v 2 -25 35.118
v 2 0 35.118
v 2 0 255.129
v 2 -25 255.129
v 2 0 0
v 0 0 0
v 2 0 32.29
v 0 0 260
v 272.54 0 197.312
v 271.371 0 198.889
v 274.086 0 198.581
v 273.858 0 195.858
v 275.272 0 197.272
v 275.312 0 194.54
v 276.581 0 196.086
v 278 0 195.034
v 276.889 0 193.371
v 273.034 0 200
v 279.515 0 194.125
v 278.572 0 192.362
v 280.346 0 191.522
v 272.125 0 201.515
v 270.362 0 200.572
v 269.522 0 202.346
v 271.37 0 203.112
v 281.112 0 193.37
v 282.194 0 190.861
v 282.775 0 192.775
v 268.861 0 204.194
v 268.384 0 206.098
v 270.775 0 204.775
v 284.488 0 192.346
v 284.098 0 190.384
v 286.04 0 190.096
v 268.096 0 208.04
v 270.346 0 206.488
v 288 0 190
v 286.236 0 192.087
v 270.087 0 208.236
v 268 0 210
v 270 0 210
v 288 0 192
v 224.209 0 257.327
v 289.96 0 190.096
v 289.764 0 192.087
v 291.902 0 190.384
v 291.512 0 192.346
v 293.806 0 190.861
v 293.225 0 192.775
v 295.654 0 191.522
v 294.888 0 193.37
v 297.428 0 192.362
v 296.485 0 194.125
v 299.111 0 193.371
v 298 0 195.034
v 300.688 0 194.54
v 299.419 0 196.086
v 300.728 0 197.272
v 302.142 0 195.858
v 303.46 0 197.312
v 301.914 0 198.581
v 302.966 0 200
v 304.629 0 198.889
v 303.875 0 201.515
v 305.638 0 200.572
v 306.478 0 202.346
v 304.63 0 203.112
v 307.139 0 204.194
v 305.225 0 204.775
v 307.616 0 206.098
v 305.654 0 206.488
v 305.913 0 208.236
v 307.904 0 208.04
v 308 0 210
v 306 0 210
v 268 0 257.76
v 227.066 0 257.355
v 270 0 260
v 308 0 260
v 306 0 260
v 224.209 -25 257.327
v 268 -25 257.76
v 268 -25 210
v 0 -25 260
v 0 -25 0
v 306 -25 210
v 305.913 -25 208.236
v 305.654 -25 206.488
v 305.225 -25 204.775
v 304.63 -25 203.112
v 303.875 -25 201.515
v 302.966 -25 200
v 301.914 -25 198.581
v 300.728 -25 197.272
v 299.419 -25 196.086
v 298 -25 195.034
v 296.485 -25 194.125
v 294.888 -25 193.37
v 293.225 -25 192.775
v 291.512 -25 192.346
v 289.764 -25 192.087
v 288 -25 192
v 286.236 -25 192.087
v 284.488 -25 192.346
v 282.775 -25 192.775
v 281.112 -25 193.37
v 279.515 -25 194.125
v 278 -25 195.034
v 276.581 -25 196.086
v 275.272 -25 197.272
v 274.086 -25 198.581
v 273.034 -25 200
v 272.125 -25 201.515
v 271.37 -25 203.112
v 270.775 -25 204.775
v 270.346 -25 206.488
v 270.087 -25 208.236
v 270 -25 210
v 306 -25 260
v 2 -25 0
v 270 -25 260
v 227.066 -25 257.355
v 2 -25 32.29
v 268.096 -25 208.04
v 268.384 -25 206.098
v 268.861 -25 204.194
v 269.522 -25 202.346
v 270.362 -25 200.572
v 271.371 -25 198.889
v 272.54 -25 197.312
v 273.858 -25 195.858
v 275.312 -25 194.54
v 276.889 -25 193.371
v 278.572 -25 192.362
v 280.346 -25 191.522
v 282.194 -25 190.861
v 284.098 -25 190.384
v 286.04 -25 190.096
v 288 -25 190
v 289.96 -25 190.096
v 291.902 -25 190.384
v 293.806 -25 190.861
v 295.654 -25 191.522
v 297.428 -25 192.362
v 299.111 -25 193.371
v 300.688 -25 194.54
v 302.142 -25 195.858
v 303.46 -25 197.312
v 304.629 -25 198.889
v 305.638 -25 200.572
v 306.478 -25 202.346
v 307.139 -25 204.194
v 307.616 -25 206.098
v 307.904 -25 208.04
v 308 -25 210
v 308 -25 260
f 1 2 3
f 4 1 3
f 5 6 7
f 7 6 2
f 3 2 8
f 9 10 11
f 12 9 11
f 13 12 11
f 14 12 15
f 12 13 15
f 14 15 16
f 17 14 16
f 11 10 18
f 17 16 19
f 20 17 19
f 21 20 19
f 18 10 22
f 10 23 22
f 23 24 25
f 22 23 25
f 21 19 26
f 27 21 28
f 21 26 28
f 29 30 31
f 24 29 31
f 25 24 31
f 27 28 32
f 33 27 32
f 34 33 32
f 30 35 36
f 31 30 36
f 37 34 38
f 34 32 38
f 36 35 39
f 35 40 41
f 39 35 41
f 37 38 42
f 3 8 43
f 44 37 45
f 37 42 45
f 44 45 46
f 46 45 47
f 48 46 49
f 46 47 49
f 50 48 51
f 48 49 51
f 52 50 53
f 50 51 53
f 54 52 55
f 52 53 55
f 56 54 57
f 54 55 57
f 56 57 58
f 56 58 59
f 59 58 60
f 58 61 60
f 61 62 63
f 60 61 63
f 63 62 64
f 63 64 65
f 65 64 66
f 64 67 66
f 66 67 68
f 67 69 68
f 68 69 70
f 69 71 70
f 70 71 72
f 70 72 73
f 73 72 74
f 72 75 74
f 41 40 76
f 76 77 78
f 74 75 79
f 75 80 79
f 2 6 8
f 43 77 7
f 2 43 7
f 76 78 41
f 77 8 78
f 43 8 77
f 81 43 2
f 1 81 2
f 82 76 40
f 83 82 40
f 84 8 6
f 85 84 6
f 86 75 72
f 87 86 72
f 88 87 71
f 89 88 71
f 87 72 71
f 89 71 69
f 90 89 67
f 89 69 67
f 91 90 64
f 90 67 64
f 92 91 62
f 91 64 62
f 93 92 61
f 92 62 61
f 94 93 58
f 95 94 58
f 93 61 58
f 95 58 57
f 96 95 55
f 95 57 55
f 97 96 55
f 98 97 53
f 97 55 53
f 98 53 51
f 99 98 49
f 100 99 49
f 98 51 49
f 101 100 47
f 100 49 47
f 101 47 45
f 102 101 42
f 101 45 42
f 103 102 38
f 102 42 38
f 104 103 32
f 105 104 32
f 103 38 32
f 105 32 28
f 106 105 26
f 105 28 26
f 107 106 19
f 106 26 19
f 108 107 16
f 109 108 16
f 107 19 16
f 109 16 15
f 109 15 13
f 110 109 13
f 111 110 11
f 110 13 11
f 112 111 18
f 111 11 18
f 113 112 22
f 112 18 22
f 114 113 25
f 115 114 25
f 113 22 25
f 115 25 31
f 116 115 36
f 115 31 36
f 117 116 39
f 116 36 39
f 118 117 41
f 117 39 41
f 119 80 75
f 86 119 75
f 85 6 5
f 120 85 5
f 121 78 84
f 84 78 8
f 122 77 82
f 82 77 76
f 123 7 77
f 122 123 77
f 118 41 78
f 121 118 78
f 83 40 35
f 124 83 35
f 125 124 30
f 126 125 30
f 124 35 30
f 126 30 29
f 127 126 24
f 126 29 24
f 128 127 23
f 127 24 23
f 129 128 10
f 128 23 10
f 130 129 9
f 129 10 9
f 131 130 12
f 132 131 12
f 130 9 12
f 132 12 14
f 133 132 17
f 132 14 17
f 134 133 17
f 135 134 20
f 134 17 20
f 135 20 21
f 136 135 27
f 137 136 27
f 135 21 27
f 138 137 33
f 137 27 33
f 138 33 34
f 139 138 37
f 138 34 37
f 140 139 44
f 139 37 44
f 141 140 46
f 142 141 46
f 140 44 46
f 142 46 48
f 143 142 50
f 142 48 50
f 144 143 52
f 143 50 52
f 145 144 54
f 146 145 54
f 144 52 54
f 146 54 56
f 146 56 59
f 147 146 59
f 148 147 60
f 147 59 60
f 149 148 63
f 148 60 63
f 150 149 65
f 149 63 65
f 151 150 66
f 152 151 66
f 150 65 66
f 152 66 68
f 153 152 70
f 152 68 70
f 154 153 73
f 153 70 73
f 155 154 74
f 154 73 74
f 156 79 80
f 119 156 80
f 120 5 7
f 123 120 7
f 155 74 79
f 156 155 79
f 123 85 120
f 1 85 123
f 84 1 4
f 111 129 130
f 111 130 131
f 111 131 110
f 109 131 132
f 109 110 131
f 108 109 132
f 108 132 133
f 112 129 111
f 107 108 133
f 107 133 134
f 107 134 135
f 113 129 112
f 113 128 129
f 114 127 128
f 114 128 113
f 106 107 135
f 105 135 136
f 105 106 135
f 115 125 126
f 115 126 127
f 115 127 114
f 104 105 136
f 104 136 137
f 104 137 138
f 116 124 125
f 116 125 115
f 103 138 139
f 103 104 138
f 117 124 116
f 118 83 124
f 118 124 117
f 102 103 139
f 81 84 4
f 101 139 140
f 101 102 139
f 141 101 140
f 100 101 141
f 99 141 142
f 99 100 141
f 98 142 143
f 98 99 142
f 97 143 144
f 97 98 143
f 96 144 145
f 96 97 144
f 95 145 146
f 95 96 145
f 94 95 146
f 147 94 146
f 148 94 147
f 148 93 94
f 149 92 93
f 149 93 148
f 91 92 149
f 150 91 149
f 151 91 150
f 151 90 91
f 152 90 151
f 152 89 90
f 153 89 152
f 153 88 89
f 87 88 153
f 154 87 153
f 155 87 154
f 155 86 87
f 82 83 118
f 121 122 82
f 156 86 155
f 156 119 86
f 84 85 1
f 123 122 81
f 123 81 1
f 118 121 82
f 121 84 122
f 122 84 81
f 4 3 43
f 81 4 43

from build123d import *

# Parameters (mm, degrees)
F1_DEPTH = 25


with BuildPart() as f1:
    # F0 (on Front) → F1 (new body)
    with BuildSketch(Plane.XZ):
        with BuildLine():
            Line((0, 260), (0, 0))
            Line((0, 0), (2, 0))
            Line((2, 0), (2, 32.289786))
            Line((2, 32.289786), (227.065674, 257.35546))
            Line((227.065674, 257.35546), (268, 257.760407))
            Line((268, 257.760407), (268, 210))
            ThreePointArc((268, 210), (288, 190), (308, 210))
            Line((308, 210), (308, 260))
            Line((308, 260), (306, 260))
            Line((306, 260), (306, 210))
            ThreePointArc((306, 210), (288, 192), (270, 210))
            Line((270, 210), (270, 260))
            Line((270, 260), (0, 260))
        make_face()
        Polygon((2, 35.118214), (2, 255.128978), (224.208987, 257.3272), align=None, mode=Mode.SUBTRACT)
    extrude(amount=F1_DEPTH)


solid = f1.part
